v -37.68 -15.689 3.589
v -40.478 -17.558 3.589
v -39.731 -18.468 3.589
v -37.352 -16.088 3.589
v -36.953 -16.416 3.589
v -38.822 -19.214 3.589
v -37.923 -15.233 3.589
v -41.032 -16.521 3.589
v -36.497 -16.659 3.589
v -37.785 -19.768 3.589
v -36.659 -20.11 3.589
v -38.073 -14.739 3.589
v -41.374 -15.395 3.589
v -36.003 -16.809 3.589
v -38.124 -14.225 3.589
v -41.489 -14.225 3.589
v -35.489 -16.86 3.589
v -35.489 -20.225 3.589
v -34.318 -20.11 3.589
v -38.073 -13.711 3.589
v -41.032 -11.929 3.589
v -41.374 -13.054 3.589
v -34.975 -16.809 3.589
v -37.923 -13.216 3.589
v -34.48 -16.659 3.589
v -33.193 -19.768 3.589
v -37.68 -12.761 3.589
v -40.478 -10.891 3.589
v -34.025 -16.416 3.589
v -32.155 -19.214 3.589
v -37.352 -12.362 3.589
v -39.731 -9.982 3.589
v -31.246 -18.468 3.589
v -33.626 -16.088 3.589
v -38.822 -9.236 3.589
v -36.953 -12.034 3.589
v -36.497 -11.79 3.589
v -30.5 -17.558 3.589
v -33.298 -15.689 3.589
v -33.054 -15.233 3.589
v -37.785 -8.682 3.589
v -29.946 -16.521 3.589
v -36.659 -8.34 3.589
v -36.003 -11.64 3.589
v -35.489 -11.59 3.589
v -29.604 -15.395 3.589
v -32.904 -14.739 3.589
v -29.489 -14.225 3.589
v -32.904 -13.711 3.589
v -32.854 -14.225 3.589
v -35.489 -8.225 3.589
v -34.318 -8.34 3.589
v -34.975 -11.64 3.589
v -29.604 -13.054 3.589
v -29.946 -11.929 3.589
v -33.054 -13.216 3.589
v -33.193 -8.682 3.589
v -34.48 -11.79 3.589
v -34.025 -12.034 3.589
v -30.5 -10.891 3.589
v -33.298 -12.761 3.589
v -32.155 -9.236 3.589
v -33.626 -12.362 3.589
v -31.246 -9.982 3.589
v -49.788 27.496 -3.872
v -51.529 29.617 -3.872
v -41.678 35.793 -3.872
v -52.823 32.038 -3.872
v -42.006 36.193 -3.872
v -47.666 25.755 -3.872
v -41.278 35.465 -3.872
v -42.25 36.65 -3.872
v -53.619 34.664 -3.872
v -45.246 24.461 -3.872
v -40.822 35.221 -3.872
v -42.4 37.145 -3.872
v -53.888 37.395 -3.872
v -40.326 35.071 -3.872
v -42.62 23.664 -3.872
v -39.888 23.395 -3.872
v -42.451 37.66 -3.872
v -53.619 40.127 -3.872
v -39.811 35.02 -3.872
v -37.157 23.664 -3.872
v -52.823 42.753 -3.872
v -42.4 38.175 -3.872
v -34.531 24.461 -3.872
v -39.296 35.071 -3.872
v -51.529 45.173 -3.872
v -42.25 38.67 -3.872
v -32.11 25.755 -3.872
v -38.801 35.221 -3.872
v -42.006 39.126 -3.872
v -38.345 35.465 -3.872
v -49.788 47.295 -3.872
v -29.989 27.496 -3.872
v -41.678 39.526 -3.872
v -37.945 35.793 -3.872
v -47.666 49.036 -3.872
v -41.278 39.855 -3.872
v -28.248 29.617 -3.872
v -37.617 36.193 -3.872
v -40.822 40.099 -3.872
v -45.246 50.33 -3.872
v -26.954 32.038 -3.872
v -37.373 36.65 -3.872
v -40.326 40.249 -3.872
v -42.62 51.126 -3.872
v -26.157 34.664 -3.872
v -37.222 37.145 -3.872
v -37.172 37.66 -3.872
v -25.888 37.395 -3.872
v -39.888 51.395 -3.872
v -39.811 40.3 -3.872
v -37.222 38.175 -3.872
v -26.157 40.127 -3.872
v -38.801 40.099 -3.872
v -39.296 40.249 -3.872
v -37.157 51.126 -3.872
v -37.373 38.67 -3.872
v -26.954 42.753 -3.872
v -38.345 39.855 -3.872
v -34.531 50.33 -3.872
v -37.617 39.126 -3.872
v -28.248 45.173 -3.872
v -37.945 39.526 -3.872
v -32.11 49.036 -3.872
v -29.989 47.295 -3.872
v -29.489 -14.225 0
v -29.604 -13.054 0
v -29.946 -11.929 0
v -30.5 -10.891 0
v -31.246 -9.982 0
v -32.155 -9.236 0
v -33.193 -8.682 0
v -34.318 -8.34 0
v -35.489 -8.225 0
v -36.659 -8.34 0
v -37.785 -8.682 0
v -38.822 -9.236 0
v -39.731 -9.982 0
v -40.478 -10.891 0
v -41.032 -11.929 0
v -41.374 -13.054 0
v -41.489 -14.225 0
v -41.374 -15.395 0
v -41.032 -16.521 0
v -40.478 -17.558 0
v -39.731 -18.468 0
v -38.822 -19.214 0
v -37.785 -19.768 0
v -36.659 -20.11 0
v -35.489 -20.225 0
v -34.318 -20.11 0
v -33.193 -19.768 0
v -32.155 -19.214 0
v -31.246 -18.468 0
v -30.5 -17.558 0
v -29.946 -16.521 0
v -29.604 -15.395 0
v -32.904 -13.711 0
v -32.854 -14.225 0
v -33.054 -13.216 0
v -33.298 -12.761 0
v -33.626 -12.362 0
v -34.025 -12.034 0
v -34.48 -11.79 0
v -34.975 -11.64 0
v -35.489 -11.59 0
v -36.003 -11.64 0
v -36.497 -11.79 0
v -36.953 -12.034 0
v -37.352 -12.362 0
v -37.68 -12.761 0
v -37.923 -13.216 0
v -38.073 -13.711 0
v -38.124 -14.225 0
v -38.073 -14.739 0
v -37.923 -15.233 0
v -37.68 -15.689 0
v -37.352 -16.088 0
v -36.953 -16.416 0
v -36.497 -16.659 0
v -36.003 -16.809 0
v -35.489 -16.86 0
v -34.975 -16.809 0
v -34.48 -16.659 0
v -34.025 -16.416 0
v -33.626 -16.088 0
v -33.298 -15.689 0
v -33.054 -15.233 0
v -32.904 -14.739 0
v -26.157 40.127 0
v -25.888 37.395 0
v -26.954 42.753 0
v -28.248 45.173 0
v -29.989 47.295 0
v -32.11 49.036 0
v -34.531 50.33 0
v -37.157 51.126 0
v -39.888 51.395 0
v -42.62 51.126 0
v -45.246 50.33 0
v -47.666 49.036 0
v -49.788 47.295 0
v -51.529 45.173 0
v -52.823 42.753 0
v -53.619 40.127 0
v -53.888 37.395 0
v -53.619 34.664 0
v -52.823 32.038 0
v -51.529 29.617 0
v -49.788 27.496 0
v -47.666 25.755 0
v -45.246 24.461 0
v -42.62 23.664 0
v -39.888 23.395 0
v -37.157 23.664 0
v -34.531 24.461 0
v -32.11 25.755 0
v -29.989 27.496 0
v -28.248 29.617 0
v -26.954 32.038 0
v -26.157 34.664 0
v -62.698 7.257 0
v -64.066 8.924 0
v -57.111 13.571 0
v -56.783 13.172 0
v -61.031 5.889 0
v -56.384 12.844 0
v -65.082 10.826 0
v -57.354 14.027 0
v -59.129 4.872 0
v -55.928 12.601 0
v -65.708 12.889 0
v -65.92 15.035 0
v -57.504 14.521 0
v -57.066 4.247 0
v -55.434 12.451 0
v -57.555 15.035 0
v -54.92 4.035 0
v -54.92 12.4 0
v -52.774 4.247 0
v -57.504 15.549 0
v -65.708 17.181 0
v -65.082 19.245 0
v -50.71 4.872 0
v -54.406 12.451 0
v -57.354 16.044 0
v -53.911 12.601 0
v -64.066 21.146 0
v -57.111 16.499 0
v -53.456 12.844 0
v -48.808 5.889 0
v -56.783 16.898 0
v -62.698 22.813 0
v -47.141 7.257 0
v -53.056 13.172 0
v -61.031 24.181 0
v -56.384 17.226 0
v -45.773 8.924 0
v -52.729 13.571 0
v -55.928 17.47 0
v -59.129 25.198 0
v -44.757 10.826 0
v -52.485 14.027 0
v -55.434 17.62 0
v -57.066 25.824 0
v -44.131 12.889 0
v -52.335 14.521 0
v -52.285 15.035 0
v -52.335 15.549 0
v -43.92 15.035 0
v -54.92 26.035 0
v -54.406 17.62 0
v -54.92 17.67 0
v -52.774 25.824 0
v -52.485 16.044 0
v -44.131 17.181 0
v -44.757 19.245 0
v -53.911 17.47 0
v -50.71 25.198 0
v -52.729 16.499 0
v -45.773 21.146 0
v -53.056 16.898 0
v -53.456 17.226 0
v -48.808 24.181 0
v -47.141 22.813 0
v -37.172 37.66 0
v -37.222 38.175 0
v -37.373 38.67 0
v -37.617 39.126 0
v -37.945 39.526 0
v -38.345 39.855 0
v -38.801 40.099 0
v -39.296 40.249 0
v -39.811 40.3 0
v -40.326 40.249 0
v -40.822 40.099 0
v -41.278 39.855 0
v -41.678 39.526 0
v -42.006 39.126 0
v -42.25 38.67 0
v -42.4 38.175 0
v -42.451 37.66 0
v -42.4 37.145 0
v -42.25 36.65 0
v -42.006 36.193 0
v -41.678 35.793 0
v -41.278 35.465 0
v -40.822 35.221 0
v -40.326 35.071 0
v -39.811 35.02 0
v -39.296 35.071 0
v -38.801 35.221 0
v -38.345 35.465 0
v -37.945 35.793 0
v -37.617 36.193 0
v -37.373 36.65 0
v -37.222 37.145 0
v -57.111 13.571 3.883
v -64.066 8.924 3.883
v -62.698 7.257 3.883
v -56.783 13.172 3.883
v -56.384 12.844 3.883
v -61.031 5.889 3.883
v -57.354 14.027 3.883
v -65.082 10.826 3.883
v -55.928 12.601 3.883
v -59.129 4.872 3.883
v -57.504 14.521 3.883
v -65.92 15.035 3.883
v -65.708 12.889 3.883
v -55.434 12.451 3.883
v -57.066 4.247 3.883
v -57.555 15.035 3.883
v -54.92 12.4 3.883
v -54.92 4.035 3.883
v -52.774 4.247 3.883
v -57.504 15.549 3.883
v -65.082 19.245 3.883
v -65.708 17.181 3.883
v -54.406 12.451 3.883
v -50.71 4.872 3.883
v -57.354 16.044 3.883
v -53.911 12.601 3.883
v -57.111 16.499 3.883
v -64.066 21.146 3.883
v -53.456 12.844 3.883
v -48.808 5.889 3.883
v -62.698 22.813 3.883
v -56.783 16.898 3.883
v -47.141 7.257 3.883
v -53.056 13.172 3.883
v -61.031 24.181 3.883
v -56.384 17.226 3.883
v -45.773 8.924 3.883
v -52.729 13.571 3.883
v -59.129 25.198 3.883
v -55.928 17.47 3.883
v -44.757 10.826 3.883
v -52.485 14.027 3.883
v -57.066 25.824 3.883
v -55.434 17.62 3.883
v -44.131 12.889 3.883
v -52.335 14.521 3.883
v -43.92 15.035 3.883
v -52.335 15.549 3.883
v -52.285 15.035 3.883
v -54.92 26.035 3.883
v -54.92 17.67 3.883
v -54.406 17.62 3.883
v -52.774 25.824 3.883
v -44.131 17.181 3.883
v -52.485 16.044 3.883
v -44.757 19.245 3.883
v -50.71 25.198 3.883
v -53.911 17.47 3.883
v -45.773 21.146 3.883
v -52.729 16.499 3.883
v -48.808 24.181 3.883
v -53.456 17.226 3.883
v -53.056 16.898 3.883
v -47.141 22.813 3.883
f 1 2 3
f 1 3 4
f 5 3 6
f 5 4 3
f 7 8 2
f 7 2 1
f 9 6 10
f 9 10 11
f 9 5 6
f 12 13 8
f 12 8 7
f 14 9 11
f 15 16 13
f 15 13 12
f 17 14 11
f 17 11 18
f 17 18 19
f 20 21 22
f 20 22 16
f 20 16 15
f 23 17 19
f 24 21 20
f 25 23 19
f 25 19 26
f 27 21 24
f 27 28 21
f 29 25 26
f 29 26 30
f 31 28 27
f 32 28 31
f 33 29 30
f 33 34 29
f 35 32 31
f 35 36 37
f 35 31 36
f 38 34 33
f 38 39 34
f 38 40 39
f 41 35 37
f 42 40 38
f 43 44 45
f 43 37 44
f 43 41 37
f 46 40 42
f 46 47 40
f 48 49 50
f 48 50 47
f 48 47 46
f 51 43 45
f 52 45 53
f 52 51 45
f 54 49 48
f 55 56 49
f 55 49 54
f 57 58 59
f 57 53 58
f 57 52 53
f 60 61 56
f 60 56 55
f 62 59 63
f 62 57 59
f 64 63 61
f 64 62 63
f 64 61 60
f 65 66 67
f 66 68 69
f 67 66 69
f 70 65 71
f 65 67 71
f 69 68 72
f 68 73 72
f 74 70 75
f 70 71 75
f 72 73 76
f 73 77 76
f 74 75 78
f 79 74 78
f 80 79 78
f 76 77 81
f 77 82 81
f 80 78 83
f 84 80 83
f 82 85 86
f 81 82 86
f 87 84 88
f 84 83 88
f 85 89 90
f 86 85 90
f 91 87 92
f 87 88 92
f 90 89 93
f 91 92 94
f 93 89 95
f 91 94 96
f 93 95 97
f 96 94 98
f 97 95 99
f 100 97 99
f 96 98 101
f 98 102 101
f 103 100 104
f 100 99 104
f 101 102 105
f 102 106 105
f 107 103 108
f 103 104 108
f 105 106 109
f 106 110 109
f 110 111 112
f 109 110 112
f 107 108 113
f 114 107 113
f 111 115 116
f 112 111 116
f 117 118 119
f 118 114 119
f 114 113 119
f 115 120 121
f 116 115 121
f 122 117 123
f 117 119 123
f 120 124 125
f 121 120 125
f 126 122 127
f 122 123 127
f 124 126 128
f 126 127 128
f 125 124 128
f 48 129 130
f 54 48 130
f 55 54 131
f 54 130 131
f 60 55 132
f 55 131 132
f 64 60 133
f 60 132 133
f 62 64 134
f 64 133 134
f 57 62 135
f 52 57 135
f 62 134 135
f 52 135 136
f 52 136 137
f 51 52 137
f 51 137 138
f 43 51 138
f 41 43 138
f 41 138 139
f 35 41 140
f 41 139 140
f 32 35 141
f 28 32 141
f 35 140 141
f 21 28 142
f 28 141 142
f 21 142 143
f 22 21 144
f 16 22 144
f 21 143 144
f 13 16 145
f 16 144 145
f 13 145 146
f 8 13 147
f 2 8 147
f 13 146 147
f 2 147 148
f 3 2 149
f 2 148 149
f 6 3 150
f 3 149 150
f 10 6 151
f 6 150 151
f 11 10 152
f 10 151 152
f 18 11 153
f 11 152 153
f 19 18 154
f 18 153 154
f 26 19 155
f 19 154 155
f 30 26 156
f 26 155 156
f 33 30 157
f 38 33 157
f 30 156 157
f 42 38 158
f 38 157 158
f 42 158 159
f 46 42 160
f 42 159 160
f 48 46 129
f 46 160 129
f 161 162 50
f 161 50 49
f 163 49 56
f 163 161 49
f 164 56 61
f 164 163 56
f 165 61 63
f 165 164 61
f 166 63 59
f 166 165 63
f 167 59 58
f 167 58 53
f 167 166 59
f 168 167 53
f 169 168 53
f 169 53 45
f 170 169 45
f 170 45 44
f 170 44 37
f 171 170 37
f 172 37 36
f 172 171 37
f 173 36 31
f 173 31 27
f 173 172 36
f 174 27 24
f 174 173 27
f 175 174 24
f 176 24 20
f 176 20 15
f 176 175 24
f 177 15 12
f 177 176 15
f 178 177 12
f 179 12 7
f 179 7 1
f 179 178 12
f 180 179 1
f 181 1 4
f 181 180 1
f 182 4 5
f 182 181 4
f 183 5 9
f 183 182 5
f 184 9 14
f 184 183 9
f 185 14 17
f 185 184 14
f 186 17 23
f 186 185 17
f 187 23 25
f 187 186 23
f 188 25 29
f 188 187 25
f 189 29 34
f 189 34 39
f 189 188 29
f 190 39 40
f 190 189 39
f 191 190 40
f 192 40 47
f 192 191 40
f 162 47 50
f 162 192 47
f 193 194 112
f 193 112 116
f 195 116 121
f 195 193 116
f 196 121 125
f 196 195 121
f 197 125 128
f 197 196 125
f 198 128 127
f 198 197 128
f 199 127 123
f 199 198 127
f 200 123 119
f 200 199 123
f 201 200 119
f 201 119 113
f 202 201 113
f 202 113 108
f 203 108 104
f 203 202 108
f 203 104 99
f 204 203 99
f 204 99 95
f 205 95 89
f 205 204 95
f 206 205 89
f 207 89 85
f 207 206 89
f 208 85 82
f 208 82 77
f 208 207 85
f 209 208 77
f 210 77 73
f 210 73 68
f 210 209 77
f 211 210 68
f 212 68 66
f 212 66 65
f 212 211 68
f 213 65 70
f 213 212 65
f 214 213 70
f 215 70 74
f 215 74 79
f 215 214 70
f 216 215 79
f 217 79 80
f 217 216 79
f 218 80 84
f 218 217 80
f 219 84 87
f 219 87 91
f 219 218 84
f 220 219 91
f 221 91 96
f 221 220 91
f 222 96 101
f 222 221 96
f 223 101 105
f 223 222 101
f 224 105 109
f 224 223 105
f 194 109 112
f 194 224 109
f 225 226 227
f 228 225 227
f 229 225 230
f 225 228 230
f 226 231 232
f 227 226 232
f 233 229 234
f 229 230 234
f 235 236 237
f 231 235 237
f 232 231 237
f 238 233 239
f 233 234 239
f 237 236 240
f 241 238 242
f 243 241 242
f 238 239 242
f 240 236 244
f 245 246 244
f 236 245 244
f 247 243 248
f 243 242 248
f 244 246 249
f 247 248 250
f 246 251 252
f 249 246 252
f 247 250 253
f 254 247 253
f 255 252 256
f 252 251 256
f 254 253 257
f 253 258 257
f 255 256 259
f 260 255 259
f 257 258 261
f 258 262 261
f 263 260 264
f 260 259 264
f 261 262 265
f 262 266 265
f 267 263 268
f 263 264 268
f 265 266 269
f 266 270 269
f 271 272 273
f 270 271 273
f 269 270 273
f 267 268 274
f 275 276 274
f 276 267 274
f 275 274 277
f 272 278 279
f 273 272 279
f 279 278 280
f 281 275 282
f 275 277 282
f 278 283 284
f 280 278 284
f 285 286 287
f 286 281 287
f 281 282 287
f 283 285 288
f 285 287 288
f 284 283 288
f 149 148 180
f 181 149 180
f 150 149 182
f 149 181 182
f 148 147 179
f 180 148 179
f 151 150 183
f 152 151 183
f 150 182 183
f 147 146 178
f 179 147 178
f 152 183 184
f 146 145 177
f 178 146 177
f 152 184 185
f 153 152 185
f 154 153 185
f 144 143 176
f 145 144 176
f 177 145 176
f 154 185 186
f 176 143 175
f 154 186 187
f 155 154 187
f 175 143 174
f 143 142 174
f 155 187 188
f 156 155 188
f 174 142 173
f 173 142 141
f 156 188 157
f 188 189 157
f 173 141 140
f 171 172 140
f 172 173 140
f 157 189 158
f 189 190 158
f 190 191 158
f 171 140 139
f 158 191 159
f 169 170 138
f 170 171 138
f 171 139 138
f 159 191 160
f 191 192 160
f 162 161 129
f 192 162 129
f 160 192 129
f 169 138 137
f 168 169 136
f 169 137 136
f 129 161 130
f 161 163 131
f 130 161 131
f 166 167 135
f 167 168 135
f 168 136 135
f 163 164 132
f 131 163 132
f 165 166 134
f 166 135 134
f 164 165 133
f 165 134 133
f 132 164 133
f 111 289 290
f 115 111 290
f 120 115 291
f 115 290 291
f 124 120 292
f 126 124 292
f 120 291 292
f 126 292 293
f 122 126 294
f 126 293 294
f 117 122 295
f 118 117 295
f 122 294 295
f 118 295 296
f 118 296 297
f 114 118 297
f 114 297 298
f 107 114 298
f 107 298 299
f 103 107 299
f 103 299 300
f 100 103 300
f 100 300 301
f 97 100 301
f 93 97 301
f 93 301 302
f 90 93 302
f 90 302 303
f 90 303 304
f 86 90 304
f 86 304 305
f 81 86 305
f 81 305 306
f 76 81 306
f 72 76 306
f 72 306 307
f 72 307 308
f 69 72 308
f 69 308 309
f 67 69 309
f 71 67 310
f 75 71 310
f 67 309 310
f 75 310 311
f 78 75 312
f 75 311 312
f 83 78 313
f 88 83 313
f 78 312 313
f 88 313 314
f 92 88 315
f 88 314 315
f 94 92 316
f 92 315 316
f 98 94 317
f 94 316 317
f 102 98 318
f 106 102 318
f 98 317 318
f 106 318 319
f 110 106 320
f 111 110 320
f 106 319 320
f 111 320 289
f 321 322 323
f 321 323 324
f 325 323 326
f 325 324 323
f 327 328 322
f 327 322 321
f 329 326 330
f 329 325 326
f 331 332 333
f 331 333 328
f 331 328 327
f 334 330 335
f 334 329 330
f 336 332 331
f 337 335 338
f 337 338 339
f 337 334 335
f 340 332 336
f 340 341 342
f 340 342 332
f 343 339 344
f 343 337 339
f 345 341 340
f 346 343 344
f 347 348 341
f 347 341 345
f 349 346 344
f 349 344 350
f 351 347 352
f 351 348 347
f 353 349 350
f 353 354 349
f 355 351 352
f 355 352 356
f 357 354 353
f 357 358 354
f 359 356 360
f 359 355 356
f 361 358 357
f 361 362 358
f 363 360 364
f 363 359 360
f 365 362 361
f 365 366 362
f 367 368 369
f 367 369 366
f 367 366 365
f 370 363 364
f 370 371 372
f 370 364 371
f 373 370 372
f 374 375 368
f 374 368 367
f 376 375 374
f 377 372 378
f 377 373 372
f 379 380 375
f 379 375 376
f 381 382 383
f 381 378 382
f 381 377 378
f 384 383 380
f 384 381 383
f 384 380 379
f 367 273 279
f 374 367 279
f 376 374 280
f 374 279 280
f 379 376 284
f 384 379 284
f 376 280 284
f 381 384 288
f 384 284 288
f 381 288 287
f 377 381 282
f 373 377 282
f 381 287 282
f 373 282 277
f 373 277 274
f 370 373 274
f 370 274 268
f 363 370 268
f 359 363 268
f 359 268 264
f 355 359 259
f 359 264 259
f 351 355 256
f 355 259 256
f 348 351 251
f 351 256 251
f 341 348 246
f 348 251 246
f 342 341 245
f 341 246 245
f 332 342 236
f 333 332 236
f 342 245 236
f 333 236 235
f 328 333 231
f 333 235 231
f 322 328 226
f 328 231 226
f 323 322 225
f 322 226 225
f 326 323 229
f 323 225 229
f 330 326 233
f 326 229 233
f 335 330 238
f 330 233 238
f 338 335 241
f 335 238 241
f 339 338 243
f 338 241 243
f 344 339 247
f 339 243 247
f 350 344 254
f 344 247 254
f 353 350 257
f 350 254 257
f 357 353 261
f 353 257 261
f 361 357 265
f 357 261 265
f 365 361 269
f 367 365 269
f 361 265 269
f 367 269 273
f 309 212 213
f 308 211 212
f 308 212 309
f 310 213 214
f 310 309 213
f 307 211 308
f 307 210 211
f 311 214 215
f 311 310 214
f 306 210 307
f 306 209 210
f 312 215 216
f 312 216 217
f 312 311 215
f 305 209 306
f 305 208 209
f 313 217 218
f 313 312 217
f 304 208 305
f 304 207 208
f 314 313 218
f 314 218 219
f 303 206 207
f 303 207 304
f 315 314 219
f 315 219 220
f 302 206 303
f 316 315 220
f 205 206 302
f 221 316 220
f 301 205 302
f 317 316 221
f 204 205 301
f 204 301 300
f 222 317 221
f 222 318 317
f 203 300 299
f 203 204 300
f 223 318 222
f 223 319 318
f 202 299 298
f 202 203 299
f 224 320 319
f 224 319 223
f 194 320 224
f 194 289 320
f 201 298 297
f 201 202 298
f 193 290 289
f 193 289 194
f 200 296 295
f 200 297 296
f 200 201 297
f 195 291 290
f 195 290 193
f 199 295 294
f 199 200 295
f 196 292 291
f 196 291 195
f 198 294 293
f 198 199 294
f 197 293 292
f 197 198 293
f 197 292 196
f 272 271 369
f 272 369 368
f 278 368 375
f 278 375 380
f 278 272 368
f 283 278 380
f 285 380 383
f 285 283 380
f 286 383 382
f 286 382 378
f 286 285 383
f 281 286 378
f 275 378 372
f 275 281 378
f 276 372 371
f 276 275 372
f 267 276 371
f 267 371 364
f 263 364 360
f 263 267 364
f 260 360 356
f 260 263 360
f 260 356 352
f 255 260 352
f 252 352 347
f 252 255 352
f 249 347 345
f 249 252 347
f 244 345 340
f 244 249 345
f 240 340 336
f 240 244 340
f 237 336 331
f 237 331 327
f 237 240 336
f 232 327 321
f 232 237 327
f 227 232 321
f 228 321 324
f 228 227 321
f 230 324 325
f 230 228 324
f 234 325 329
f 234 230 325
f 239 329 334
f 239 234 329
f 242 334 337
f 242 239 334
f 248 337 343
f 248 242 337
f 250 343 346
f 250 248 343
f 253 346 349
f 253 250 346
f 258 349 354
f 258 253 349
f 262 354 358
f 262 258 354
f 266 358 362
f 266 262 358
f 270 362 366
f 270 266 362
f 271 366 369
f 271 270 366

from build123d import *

# Parameters (mm, degrees)
F0_R     = 14
F1_DEPTH = 3.8715
F2_R     = 2.639664
F3_DEPTH = 25
F4_R     = 11
F4_R_2   = 2.635
F5_DEPTH = 3.88268
F6_R     = 6
F6_R_2   = 2.635
F7_DEPTH = 3.58938


with BuildPart() as f1:
    # F0 (on Top) → F1 (new body)
    with BuildSketch(Plane.XY):
        with Locations((-39.88827, 37.395254)):
            Circle(F0_R)
    extrude(amount=-F1_DEPTH)

    # F2 (on Top) → F3 (cut)
    with BuildSketch(Plane.XY):
        with Locations((-39.811349, 37.659839)):
            Circle(F2_R)
    extrude(amount=-F3_DEPTH, mode=Mode.SUBTRACT)


with BuildPart() as f5:
    # F4 (on Top) → F5 (new body)
    with BuildSketch(Plane.XY):
        with Locations((-54.919645, 15.035159)):
            Circle(F4_R)
        with Locations((-54.919645, 15.035159)):
            Circle(F4_R_2, mode=Mode.SUBTRACT)
    extrude(amount=F5_DEPTH)


with BuildPart() as f7:
    # F6 (on Top) → F7 (new body)
    with BuildSketch(Plane.XY):
        with Locations((-35.488829, -14.224861)):
            Circle(F6_R)
        with Locations((-35.488829, -14.224861)):
            Circle(F6_R_2, mode=Mode.SUBTRACT)
    extrude(amount=F7_DEPTH)


solid = Compound([f1.part, f5.part, f7.part])
